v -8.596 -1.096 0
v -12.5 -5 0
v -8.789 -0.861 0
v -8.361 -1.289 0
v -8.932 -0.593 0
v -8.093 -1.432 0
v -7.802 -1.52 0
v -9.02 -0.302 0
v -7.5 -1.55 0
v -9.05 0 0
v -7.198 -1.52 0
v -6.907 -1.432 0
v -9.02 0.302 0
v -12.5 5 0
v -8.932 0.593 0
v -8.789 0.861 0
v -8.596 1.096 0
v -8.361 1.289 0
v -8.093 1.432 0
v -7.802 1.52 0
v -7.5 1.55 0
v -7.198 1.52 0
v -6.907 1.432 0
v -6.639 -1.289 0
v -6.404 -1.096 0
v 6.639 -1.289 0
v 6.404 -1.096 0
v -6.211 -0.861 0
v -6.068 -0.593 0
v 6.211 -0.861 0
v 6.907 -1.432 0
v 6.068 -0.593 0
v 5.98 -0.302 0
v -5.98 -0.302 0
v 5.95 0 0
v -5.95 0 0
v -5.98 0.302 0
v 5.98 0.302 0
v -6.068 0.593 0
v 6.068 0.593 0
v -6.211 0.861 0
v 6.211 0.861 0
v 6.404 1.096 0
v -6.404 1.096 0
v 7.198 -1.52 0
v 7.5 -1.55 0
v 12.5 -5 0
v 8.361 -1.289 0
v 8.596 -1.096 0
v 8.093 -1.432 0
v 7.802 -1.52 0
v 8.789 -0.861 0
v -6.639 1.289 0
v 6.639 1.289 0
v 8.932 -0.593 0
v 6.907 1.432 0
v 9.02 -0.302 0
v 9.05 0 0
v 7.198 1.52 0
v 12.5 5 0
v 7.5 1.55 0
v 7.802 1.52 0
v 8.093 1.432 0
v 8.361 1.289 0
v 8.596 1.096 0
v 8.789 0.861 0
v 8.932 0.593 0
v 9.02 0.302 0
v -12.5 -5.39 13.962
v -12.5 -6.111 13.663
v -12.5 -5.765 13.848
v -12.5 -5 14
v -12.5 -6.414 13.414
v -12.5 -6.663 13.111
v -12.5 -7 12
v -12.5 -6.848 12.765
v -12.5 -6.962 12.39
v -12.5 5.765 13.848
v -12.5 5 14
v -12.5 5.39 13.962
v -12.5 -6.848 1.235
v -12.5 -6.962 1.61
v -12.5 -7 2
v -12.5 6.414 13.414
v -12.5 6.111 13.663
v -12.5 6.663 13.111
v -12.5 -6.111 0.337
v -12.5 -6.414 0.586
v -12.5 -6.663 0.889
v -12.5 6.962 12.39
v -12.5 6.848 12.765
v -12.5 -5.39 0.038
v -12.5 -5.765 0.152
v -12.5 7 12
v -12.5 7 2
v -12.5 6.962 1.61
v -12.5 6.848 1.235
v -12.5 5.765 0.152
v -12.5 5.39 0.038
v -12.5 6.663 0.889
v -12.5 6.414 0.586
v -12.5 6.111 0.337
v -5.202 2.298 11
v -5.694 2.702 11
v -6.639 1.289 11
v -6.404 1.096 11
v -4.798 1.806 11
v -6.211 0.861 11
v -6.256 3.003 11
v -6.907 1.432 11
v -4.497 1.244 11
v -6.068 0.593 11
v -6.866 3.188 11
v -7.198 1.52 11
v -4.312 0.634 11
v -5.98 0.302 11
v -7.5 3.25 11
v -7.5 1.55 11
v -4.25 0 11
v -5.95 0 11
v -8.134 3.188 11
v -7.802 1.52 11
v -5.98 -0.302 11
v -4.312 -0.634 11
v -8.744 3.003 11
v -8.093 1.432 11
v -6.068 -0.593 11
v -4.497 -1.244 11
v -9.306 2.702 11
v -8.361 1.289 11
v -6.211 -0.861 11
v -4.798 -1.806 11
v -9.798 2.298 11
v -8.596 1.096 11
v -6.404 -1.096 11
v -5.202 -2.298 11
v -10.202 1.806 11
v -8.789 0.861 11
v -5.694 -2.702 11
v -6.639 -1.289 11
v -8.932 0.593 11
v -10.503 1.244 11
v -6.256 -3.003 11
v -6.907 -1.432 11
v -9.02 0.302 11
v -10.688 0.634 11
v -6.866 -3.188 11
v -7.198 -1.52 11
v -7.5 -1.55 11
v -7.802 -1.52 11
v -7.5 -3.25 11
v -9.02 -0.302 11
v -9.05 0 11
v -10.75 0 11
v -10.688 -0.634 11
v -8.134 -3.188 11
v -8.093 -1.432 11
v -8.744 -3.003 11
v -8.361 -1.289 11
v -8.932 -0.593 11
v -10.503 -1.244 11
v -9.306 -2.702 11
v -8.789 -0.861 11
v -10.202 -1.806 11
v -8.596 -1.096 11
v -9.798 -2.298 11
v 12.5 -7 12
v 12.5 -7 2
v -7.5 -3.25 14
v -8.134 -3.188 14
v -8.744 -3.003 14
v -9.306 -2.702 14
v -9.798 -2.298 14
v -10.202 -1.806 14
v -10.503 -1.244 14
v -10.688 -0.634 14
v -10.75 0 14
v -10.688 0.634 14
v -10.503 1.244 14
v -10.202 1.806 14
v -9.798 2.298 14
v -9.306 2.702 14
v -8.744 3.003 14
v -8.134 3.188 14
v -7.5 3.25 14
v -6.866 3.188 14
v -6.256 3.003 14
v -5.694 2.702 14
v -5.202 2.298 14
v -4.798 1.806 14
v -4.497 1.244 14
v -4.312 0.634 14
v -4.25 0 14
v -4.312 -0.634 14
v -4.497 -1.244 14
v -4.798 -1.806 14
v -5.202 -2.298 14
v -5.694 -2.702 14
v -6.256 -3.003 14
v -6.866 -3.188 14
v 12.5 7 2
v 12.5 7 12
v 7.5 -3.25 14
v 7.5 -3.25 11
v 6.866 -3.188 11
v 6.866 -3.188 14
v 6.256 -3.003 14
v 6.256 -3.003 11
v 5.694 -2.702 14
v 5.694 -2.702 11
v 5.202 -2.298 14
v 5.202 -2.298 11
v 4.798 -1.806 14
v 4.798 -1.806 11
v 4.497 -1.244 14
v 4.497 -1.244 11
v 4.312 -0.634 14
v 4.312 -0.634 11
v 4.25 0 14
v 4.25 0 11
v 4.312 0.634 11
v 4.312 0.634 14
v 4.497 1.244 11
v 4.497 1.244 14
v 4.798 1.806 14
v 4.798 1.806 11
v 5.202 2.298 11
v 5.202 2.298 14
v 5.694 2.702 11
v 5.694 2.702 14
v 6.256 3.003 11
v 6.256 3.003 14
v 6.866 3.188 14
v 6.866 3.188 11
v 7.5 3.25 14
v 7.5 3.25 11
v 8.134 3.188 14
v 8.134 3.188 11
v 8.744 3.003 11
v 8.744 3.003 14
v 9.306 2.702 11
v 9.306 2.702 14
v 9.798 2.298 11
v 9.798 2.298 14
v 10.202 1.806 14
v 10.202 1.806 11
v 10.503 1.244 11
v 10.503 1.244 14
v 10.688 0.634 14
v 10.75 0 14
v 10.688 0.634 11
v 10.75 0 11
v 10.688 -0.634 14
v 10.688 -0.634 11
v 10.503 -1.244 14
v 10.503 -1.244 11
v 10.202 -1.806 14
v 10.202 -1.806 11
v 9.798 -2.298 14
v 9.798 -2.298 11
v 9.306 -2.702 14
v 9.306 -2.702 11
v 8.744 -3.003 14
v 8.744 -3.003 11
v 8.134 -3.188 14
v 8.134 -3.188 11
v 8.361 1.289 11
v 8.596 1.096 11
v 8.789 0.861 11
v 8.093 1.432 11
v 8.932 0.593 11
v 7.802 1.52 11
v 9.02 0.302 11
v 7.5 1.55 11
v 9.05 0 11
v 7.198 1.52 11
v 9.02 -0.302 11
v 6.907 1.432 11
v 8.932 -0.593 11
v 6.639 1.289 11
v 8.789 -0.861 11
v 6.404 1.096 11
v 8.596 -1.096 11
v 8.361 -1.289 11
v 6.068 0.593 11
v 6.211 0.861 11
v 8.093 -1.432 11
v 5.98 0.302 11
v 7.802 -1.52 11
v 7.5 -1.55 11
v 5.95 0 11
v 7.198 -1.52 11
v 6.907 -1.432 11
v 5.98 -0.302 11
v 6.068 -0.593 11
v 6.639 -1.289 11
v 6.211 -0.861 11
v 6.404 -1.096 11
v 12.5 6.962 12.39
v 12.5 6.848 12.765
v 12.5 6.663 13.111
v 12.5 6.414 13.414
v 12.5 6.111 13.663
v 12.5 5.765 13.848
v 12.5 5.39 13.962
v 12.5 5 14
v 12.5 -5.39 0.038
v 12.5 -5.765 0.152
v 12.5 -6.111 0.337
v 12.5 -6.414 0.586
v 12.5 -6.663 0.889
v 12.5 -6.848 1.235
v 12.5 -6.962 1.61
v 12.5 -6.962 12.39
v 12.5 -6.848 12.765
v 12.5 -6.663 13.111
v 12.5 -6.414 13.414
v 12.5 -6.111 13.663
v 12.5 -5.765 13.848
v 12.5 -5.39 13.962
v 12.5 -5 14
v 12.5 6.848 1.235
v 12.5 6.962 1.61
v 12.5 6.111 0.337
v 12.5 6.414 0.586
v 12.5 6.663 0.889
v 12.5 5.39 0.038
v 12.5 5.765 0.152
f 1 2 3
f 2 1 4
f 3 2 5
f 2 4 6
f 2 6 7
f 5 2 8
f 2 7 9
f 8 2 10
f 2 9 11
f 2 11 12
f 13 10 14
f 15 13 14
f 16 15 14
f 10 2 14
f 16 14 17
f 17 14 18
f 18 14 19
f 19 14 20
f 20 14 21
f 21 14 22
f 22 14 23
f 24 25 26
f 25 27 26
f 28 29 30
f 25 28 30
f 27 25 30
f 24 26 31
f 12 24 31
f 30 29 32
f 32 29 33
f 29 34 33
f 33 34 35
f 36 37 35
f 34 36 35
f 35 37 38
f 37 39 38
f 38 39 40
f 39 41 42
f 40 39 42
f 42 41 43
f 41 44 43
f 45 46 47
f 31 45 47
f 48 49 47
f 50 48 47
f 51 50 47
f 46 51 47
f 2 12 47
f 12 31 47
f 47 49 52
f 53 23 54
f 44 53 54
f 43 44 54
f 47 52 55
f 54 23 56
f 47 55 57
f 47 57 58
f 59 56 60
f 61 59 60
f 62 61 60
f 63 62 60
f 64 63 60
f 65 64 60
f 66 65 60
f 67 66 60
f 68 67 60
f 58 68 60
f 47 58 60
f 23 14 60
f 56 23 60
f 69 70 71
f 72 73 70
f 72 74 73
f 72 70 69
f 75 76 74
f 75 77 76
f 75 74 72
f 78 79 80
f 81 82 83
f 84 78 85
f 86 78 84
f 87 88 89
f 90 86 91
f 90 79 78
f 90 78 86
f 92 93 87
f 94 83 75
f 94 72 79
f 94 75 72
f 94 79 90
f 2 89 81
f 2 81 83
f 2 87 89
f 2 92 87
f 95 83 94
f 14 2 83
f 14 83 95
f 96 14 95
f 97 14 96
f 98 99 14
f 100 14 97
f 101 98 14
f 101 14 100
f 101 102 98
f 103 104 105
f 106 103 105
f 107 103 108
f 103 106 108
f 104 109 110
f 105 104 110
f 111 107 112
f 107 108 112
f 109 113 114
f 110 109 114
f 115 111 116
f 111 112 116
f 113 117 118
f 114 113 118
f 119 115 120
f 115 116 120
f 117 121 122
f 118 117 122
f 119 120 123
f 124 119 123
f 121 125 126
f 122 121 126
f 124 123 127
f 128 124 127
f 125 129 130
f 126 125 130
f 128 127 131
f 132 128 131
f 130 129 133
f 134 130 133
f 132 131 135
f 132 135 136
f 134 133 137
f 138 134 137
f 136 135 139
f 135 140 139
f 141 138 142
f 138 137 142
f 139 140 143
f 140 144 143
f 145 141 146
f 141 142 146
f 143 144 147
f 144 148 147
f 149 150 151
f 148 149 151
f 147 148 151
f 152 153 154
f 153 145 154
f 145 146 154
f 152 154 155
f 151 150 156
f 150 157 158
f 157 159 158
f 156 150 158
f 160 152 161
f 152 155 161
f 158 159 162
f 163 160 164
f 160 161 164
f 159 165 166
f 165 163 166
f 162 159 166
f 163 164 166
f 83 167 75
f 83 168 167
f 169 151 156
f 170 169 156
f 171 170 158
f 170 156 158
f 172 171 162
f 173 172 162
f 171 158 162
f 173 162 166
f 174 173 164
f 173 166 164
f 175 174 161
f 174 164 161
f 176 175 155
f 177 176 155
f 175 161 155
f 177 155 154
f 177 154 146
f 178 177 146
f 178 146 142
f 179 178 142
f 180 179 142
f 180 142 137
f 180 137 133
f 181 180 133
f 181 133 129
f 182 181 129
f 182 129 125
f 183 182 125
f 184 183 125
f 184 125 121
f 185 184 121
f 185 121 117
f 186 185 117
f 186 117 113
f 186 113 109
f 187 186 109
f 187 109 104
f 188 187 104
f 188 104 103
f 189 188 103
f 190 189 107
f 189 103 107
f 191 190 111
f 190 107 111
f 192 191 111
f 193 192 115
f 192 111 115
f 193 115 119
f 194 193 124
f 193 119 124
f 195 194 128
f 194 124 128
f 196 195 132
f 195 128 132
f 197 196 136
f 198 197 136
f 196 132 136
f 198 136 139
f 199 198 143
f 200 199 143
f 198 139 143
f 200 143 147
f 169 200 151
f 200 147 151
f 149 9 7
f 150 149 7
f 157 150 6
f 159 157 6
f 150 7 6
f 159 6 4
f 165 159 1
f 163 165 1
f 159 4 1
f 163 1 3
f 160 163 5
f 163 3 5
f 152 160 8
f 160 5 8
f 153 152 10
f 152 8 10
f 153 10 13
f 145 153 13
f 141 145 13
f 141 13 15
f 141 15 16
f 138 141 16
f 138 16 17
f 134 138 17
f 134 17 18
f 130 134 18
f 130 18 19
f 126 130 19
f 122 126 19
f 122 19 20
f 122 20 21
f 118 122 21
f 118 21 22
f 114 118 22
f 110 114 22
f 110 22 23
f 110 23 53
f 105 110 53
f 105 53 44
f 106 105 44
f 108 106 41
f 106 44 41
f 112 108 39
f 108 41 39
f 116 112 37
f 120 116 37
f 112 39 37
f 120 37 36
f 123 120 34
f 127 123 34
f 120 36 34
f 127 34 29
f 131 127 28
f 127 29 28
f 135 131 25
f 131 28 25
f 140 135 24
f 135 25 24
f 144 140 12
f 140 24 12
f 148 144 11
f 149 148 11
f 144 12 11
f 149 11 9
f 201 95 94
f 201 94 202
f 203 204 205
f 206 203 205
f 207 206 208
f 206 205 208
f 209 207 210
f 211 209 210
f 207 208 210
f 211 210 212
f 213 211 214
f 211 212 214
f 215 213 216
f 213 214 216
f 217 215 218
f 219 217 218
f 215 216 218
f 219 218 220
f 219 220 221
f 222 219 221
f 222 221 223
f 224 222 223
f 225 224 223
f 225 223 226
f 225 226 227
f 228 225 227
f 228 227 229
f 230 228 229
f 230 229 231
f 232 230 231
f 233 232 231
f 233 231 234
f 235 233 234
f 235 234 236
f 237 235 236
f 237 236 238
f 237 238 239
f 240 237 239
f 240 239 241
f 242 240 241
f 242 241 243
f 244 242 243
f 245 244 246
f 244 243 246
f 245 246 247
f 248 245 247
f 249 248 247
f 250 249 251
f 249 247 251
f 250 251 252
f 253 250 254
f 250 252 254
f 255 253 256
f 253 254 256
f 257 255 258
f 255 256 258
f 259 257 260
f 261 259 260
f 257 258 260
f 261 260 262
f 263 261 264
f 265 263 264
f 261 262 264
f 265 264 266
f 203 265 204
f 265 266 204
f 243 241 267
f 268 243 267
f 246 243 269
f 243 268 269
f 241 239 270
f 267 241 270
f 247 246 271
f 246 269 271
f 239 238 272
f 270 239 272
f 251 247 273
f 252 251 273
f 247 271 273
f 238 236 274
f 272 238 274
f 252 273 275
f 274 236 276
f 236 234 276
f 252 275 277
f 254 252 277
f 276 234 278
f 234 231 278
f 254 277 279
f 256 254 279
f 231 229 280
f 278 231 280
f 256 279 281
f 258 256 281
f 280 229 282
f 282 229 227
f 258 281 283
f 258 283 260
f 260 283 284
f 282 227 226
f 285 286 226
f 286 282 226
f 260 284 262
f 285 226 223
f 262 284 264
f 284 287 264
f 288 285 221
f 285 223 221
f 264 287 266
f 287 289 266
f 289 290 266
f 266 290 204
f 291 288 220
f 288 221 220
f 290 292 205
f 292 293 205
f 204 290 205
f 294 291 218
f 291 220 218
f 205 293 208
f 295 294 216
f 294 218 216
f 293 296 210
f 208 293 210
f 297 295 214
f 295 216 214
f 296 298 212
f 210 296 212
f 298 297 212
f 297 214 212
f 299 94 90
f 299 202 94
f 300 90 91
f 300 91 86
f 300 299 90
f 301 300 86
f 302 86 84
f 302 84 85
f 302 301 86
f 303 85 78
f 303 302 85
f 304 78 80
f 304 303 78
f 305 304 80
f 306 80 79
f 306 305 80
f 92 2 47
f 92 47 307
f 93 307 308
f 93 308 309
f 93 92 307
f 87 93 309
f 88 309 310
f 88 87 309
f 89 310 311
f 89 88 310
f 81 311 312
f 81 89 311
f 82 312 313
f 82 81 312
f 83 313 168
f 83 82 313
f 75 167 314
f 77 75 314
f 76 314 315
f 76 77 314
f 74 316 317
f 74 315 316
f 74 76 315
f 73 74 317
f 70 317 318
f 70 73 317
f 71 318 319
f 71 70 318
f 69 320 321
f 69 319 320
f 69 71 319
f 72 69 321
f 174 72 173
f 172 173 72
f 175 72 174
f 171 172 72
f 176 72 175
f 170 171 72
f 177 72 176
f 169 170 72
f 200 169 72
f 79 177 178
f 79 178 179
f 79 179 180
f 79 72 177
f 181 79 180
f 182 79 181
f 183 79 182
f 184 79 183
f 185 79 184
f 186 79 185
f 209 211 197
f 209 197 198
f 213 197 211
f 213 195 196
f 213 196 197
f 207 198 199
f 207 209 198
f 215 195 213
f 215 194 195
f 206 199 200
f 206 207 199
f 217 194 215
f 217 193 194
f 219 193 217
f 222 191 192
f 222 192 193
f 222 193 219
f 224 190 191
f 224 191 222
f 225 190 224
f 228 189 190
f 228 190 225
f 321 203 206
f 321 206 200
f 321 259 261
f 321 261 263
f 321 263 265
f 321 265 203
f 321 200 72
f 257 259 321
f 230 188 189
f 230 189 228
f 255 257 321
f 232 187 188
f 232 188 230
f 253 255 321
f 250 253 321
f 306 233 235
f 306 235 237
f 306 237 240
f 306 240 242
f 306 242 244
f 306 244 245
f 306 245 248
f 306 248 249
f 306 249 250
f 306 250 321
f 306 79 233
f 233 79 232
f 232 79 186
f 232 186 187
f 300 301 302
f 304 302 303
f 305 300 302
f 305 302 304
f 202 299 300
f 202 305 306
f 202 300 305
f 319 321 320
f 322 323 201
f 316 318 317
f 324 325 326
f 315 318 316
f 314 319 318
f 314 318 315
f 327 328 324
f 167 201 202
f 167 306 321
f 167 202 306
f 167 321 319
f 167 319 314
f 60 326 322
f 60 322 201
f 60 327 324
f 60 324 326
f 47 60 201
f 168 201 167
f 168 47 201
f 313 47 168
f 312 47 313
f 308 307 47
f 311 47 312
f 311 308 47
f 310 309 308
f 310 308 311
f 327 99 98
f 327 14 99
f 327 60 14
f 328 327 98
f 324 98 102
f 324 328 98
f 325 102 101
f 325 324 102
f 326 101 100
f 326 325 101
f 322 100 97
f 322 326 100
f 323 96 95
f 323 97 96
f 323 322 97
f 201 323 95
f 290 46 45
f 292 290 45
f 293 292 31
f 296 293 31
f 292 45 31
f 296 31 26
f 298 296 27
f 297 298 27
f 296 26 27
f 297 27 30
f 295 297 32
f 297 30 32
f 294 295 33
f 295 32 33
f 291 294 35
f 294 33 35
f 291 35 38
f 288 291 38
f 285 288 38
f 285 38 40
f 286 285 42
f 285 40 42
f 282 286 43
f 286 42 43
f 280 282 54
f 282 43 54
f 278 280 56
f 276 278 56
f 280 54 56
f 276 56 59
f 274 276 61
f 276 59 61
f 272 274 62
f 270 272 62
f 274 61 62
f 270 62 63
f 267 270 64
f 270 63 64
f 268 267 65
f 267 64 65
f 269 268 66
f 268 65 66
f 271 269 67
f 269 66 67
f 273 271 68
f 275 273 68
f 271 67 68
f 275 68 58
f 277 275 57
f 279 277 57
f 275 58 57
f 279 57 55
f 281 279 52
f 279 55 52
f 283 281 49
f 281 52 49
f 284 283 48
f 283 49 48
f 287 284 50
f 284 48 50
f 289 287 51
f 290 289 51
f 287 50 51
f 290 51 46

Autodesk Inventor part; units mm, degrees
ref_plane "YZ Plane" through (0, 0, 0) normal (1, 0, 0) x (0, 1, 0)
ref_plane "XZ Plane" through (0, 0, 0) normal (0, 1, 0) x (-1, 0, 0)
ref_plane "XY Plane" through (0, 0, 0) normal (0, 0, 1) x (1, 0, 0)
sketch "Sketch1" plane through (0, 0, 0) normal (0, 0, 1) x (1, 0, 0)
  line L0 (-12.5, 7) -> (12.5, 7)
  line L1 (12.5, 7) -> (12.5, -7)
  line L2 (12.5, -7) -> (-12.5, -7)
  line L3 (-12.5, -7) -> (-12.5, 7)
  point P0 (0, 0)
  point P1 (12.5, 0)
  point P2 (0, 7)
  dimension "d0" = 25
  dimension "d2" = 14
extrude "Extrusion1" add sketch "Sketch1" along normal blind 14
sketch "Sketch2" plane through (0, 0, 14) normal (0, 0, 1) x (1, 0, 0)
  line L0 (-7.5, 0) -> (7.5, 0)
  point P0 (0, 0)
  point P1 (0, 0)
  dimension "d5" = 15
hole "Hole1" at (-7.5, 0, 14) at (7.5, 0, 14) direction (0, 0, -1) diameter 3.1 end through all counterbore diameter 6.5 counterbore depth 3 clearance for "Socket Head Cap Screw" size "M3" standard "Ansi Metric M Profile"
fillet "Fillet1" radius 2 2 edges at (0, 7, 0) (0, -7, 0)
fillet "Fillet2" radius 2 2 edges at (0, 7, 14) (0, -7, 14)
properties part number "string tensioner"
